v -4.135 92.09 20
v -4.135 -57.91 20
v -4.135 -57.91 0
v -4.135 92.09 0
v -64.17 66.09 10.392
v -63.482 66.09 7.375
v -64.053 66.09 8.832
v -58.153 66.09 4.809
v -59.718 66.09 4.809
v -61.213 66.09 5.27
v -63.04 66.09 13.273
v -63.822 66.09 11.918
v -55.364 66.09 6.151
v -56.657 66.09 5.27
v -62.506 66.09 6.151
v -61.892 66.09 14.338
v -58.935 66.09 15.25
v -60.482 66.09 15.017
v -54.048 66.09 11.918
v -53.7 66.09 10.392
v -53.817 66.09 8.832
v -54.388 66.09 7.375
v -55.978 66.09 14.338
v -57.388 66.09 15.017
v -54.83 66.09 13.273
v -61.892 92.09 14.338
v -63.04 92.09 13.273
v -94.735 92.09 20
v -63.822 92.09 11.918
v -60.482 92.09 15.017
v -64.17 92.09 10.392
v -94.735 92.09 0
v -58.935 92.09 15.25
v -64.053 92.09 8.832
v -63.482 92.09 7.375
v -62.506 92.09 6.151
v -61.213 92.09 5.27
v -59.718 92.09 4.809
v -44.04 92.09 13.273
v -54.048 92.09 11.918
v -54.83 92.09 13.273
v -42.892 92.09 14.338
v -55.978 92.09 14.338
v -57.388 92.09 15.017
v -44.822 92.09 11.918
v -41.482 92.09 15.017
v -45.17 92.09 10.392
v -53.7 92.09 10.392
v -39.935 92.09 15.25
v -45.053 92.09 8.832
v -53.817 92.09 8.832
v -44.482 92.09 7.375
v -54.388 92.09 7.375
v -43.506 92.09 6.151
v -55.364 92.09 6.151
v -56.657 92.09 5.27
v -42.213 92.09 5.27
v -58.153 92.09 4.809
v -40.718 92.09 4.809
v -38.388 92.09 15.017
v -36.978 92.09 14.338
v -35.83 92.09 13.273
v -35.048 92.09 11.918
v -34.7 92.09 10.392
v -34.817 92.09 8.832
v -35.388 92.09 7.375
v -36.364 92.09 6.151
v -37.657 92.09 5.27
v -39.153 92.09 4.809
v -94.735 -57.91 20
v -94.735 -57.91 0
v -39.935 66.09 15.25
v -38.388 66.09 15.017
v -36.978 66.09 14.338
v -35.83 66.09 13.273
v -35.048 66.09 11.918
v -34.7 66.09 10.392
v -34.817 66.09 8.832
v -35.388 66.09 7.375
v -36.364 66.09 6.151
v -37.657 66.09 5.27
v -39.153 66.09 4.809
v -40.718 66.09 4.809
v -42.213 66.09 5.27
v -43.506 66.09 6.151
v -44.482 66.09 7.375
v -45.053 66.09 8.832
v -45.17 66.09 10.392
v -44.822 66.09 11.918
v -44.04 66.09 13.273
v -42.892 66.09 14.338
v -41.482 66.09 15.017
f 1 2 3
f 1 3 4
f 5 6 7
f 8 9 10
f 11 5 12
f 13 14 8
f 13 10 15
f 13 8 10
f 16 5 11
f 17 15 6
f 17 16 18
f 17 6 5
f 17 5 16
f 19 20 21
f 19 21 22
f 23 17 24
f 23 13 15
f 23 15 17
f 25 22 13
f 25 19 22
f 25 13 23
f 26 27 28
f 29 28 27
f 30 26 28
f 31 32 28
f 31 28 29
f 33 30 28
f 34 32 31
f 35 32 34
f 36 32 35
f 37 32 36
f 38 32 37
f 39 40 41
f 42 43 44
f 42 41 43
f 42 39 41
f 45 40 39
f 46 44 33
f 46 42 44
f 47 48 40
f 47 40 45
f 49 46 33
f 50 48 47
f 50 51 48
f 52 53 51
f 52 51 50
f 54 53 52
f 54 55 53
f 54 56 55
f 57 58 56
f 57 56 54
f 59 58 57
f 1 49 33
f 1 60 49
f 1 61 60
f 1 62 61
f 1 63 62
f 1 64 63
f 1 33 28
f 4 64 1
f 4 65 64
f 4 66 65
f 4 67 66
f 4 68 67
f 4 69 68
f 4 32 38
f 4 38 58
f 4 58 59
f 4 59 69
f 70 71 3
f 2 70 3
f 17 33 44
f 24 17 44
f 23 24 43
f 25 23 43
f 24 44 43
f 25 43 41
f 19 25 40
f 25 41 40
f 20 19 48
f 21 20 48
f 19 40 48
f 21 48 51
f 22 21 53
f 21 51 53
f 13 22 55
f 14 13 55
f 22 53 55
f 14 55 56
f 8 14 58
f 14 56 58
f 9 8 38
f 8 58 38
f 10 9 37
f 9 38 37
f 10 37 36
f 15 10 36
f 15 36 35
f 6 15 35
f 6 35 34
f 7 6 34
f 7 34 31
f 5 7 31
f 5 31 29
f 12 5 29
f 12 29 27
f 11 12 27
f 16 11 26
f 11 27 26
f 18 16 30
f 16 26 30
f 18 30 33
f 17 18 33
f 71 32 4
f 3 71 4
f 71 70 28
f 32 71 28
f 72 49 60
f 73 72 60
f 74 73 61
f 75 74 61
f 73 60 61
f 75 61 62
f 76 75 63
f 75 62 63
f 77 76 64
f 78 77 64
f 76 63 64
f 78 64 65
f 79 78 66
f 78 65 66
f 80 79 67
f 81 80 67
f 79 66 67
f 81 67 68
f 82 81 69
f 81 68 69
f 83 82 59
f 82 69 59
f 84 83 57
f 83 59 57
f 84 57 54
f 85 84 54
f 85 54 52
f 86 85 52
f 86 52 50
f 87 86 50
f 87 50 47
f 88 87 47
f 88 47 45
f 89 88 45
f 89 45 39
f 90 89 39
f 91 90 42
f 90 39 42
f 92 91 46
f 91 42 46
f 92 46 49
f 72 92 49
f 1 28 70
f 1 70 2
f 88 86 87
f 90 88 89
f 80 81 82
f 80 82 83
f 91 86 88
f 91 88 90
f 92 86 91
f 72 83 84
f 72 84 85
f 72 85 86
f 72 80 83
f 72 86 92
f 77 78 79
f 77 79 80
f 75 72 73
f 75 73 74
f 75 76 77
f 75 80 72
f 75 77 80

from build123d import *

# Parameters (mm, degrees)
SKETCH1_W           = 100
SKETCH1_H           = 150
BOSS_EXTRUDE1_DEPTH = 20
SKETCH2_R           = 5.25
CUT_EXTRUDE1_DEPTH  = 26
SKETCH3_W           = 4.7
SKETCH3_H           = 150
CUT_EXTRUDE2_DEPTH  = 20


with BuildPart() as part:
    # Sketch1 → Boss-Extrude1 (new body)
    with BuildSketch(Plane.XY):
        with Locations((-49.435028249, 17.09039548)):
            Rectangle(SKETCH1_W, SKETCH1_H)
    extrude(amount=BOSS_EXTRUDE1_DEPTH)

    # Sketch2 → Cut-Extrude1 (cut)
    with BuildSketch(Plane(origin=(0, 92.09039548, 0), x_dir=(1, 0, 0), z_dir=(0, 1, 0))):
        with Locations(Location((-58.935028249, -10, 0), (0, 0, 270))):
            Circle(SKETCH2_R)
        with Locations(Location((-39.935028249, -10, 0), (0, 0, 270))):
            Circle(SKETCH2_R)
    extrude(amount=-CUT_EXTRUDE1_DEPTH, mode=Mode.SUBTRACT)

    # Sketch3 → Cut-Extrude2 (cut)
    with BuildSketch(Plane.XY.offset(20)):
        with Locations((-97.085028249, 17.09039548)):
            Rectangle(SKETCH3_W, SKETCH3_H)
        with Locations((-1.785028249, 17.09039548)):
            Rectangle(SKETCH3_W, SKETCH3_H)
    extrude(amount=-CUT_EXTRUDE2_DEPTH, mode=Mode.SUBTRACT)


solid = part.part
